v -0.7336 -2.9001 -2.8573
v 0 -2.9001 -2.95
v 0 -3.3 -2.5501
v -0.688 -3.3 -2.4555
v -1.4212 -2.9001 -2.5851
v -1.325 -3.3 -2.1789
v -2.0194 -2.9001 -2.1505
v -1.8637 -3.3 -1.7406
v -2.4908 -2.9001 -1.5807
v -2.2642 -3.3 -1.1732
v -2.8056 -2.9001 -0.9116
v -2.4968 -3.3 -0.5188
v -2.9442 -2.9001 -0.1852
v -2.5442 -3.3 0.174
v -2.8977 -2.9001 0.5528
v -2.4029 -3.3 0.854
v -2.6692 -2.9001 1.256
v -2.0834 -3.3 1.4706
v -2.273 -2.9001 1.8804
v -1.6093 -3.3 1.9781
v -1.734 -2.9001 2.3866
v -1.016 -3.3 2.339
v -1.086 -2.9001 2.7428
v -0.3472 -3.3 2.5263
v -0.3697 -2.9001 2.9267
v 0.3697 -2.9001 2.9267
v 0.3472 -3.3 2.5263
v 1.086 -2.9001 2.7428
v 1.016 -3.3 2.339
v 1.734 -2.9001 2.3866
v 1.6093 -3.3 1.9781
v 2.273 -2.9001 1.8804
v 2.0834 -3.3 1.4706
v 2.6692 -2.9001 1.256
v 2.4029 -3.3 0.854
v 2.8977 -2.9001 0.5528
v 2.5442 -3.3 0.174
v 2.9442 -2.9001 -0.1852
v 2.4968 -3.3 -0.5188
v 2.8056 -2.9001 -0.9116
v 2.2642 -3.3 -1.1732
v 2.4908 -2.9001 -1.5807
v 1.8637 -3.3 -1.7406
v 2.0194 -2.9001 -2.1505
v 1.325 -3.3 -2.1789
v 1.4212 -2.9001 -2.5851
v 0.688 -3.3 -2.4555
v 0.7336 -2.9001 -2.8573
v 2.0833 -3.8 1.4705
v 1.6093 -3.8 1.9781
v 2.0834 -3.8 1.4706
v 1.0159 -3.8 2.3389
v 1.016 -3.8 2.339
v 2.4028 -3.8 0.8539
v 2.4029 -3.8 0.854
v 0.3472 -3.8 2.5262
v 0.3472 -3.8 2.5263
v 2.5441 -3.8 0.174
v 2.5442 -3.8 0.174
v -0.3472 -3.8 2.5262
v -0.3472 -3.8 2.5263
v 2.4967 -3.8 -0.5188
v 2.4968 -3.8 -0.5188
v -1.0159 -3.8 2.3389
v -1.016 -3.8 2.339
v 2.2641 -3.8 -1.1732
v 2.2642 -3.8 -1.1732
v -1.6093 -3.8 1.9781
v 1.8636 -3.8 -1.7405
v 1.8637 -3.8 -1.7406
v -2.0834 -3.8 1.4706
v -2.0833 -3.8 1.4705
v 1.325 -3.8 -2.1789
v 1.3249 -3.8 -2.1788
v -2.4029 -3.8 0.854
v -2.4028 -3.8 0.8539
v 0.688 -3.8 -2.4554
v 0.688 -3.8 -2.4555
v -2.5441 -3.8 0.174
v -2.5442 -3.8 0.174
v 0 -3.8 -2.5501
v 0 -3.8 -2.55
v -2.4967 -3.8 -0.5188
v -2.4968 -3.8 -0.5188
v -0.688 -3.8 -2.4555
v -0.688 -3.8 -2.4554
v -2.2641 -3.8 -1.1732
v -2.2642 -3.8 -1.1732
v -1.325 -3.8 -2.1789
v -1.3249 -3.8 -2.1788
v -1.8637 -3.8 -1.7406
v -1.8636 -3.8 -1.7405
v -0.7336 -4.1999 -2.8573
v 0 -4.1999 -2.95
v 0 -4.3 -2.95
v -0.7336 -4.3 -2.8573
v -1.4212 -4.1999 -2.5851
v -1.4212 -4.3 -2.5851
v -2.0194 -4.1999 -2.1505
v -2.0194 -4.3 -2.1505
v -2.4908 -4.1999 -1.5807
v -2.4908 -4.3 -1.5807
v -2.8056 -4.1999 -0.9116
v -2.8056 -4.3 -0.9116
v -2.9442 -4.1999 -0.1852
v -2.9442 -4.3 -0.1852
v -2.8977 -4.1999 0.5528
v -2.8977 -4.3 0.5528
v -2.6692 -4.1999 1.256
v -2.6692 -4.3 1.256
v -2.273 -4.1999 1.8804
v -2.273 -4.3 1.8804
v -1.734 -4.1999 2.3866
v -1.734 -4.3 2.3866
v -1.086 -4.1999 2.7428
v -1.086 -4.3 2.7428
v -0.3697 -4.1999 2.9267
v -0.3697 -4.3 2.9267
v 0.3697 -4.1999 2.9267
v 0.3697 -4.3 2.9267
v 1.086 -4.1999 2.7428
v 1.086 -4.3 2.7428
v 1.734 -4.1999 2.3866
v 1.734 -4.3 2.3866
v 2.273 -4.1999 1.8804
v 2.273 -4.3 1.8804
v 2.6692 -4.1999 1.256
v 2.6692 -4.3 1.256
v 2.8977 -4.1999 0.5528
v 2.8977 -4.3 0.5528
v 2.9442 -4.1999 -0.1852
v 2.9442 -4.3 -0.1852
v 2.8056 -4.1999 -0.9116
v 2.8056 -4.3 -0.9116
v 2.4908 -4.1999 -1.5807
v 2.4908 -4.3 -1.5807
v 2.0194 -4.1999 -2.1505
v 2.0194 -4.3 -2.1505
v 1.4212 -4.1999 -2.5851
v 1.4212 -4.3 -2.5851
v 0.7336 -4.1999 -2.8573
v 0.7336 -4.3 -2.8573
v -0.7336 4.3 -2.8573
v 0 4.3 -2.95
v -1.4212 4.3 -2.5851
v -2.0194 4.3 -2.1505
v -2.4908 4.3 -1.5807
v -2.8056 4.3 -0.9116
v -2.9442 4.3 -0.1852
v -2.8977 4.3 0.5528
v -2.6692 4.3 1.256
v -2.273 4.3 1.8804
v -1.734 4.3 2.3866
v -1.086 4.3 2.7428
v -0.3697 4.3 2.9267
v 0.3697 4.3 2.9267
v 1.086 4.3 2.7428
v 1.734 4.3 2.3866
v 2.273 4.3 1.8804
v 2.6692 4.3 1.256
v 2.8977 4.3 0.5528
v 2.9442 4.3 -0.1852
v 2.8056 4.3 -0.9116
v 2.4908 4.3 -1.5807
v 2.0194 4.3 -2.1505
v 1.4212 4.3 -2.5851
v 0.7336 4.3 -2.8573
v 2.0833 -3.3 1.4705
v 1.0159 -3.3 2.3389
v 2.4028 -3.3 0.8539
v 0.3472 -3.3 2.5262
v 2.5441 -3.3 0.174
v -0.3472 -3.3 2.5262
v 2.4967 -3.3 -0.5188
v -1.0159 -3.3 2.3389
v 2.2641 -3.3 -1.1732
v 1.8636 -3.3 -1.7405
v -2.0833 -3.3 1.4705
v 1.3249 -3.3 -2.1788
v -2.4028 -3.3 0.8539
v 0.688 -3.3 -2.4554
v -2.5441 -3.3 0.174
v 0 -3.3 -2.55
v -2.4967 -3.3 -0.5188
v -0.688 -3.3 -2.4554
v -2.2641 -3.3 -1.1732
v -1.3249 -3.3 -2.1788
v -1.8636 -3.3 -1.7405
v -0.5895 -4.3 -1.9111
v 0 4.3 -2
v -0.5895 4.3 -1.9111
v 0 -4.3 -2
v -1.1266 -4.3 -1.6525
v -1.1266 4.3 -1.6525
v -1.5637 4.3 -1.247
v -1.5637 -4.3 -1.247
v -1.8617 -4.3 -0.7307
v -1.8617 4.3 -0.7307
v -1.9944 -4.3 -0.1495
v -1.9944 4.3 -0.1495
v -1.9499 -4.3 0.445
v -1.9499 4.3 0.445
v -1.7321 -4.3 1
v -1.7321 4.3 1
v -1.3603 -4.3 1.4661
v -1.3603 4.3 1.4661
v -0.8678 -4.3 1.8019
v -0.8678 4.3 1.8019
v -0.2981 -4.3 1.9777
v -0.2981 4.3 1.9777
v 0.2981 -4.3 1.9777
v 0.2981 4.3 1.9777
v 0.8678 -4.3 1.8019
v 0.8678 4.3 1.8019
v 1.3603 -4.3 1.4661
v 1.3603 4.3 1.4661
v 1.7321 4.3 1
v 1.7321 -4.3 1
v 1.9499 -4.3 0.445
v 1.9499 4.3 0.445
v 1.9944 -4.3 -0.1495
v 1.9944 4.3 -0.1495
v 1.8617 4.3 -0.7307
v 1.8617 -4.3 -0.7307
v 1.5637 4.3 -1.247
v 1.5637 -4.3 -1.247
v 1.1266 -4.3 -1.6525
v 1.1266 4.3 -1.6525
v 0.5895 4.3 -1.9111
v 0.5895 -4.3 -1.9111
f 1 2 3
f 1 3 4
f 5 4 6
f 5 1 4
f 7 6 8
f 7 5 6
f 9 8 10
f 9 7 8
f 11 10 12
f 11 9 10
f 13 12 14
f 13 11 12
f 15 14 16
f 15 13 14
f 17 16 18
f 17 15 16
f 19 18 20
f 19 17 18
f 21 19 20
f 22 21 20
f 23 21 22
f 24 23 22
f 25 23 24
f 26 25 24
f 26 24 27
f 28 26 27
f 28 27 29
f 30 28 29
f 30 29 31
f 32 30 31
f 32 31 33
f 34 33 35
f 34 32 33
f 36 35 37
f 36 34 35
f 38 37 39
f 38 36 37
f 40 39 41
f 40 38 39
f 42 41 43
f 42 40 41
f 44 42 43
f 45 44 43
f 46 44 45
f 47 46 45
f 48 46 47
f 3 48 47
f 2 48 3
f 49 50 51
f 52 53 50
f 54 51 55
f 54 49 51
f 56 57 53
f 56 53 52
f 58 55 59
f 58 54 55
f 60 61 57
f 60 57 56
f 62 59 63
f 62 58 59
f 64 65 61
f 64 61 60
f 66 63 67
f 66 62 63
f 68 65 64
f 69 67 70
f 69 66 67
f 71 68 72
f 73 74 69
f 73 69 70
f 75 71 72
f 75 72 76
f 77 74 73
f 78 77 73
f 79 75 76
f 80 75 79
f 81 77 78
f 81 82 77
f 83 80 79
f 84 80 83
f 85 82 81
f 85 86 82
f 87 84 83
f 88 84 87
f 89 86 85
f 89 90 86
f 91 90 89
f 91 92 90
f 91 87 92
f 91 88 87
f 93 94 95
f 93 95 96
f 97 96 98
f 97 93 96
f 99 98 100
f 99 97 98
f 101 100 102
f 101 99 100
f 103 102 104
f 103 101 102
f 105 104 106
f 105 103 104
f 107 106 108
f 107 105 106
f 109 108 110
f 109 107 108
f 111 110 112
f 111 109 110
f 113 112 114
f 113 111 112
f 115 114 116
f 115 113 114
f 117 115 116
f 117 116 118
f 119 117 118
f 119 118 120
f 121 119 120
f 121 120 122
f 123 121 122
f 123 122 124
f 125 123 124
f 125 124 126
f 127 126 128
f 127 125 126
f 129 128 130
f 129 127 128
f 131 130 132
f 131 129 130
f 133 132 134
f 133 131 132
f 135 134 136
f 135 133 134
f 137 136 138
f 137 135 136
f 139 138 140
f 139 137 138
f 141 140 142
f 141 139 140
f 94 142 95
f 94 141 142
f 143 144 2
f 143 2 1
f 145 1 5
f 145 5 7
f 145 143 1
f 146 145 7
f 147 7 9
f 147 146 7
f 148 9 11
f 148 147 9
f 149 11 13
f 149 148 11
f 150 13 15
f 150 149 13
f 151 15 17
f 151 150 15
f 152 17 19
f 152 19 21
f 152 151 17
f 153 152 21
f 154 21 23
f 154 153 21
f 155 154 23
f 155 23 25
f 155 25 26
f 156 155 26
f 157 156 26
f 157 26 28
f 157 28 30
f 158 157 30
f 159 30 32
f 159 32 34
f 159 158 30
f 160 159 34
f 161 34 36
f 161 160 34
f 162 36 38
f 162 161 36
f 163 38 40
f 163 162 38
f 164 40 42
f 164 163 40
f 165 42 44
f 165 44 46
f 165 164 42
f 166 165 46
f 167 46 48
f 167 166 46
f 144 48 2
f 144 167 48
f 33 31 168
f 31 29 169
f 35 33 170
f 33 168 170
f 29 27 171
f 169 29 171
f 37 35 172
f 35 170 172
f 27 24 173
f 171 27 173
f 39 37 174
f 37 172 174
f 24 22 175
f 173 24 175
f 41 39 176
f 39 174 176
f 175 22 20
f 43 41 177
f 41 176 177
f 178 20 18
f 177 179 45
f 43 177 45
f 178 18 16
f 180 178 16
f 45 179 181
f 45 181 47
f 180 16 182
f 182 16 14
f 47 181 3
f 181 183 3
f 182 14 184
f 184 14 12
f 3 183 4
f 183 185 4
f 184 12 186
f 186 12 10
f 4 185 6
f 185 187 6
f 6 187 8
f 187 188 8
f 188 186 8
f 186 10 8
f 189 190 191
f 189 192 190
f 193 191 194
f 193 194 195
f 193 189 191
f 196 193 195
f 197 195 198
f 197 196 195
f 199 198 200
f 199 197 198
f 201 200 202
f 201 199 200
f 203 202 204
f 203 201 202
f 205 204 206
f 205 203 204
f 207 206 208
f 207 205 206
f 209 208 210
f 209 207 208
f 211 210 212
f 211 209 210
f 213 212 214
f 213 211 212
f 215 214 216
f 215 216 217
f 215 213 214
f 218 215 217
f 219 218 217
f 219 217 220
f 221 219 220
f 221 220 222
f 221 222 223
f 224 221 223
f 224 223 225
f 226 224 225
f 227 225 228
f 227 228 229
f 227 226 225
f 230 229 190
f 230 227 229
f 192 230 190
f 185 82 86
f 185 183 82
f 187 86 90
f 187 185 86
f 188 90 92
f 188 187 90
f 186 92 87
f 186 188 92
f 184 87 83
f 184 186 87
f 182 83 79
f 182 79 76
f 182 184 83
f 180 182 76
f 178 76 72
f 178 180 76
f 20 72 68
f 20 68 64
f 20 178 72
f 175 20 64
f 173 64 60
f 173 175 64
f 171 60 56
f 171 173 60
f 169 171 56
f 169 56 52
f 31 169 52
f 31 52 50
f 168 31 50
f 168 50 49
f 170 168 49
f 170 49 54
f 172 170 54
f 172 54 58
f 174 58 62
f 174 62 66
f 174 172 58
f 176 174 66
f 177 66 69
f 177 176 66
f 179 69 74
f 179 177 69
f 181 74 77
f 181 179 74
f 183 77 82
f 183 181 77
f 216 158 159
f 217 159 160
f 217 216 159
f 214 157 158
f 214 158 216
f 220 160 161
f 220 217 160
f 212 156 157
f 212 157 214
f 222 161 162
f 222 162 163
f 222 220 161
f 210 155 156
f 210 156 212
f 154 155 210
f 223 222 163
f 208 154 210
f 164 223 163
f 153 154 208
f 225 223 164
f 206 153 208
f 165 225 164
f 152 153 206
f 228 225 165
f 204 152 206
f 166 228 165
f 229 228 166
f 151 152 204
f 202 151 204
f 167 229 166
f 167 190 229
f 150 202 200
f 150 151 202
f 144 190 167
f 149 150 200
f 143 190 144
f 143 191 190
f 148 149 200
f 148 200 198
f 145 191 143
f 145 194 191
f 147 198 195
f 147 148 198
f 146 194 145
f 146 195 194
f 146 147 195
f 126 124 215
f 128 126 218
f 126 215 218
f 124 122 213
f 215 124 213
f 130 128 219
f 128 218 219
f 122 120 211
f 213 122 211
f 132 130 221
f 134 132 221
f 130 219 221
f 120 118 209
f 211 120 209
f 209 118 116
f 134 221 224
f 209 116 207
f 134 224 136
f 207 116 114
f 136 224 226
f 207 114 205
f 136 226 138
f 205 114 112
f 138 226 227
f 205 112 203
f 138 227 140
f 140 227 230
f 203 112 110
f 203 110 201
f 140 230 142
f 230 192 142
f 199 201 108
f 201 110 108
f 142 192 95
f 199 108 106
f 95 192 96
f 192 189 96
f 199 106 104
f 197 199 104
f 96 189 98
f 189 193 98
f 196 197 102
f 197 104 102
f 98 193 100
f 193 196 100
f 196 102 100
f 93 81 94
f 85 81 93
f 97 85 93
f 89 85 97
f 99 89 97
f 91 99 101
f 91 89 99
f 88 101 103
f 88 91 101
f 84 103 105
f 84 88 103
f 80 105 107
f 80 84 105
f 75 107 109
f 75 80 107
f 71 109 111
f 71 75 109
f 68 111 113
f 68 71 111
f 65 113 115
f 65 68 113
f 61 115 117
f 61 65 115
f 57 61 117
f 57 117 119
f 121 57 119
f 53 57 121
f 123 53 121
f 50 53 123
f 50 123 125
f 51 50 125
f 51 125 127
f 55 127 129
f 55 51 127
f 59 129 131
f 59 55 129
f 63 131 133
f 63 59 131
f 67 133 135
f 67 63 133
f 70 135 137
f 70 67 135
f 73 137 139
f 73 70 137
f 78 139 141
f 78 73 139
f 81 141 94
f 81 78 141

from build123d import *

# Parameters (mm, degrees)
SKETCH_1_R      = 2.95
SKETCH_1_R_2    = 2
EXTRUDE_1_DEPTH = 4.3
SKETCH_2_W      = 0.4
SKETCH_2_H      = 0.5
CHAMFER_1_SIZE  = 0.4


with BuildPart() as part:
    # 草图1 → 凸台-拉伸1 (new, symmetric)
    with BuildSketch(Plane(origin=(0, 0, 0), x_dir=(1, 0, 0), z_dir=(0, 1, 0))):
        with Locations(Location((0, 0, 0), (0, 0, 90))):
            Circle(SKETCH_1_R)
        with Locations(Location((0, 0, 0), (0, 0, 90))):
            Circle(SKETCH_1_R_2, mode=Mode.SUBTRACT)
    extrude(amount=EXTRUDE_1_DEPTH, both=True)

    # 草图2 → 切除-旋转1 (revolve, cut)
    with BuildSketch(Plane(origin=(0, 0, 0), x_dir=(0, 0, -1), z_dir=(1, 0, 0)), mode=Mode.PRIVATE) as cut_revolve_1_sk:
        with Locations((-2.75, -3.55)):
            Rectangle(SKETCH_2_W, SKETCH_2_H)
    revolve(cut_revolve_1_sk.sketch.rotate(Axis((0, -1000, 0), (0, 1, 0)), 180), axis=Axis((0, -1000, 0), (0, 1, 0)), mode=Mode.SUBTRACT)

    # 倒角1
    chamfer_1_edges = [part.edges().sort_by_distance(p)[0] for p in [
        (0, -3.3, 2.95),
        (0, -3.8, 2.95),
    ]]
    chamfer(chamfer_1_edges, length=CHAMFER_1_SIZE - 0.0001)  # a hair under: the kernel refuses the full size


solid = part.part
